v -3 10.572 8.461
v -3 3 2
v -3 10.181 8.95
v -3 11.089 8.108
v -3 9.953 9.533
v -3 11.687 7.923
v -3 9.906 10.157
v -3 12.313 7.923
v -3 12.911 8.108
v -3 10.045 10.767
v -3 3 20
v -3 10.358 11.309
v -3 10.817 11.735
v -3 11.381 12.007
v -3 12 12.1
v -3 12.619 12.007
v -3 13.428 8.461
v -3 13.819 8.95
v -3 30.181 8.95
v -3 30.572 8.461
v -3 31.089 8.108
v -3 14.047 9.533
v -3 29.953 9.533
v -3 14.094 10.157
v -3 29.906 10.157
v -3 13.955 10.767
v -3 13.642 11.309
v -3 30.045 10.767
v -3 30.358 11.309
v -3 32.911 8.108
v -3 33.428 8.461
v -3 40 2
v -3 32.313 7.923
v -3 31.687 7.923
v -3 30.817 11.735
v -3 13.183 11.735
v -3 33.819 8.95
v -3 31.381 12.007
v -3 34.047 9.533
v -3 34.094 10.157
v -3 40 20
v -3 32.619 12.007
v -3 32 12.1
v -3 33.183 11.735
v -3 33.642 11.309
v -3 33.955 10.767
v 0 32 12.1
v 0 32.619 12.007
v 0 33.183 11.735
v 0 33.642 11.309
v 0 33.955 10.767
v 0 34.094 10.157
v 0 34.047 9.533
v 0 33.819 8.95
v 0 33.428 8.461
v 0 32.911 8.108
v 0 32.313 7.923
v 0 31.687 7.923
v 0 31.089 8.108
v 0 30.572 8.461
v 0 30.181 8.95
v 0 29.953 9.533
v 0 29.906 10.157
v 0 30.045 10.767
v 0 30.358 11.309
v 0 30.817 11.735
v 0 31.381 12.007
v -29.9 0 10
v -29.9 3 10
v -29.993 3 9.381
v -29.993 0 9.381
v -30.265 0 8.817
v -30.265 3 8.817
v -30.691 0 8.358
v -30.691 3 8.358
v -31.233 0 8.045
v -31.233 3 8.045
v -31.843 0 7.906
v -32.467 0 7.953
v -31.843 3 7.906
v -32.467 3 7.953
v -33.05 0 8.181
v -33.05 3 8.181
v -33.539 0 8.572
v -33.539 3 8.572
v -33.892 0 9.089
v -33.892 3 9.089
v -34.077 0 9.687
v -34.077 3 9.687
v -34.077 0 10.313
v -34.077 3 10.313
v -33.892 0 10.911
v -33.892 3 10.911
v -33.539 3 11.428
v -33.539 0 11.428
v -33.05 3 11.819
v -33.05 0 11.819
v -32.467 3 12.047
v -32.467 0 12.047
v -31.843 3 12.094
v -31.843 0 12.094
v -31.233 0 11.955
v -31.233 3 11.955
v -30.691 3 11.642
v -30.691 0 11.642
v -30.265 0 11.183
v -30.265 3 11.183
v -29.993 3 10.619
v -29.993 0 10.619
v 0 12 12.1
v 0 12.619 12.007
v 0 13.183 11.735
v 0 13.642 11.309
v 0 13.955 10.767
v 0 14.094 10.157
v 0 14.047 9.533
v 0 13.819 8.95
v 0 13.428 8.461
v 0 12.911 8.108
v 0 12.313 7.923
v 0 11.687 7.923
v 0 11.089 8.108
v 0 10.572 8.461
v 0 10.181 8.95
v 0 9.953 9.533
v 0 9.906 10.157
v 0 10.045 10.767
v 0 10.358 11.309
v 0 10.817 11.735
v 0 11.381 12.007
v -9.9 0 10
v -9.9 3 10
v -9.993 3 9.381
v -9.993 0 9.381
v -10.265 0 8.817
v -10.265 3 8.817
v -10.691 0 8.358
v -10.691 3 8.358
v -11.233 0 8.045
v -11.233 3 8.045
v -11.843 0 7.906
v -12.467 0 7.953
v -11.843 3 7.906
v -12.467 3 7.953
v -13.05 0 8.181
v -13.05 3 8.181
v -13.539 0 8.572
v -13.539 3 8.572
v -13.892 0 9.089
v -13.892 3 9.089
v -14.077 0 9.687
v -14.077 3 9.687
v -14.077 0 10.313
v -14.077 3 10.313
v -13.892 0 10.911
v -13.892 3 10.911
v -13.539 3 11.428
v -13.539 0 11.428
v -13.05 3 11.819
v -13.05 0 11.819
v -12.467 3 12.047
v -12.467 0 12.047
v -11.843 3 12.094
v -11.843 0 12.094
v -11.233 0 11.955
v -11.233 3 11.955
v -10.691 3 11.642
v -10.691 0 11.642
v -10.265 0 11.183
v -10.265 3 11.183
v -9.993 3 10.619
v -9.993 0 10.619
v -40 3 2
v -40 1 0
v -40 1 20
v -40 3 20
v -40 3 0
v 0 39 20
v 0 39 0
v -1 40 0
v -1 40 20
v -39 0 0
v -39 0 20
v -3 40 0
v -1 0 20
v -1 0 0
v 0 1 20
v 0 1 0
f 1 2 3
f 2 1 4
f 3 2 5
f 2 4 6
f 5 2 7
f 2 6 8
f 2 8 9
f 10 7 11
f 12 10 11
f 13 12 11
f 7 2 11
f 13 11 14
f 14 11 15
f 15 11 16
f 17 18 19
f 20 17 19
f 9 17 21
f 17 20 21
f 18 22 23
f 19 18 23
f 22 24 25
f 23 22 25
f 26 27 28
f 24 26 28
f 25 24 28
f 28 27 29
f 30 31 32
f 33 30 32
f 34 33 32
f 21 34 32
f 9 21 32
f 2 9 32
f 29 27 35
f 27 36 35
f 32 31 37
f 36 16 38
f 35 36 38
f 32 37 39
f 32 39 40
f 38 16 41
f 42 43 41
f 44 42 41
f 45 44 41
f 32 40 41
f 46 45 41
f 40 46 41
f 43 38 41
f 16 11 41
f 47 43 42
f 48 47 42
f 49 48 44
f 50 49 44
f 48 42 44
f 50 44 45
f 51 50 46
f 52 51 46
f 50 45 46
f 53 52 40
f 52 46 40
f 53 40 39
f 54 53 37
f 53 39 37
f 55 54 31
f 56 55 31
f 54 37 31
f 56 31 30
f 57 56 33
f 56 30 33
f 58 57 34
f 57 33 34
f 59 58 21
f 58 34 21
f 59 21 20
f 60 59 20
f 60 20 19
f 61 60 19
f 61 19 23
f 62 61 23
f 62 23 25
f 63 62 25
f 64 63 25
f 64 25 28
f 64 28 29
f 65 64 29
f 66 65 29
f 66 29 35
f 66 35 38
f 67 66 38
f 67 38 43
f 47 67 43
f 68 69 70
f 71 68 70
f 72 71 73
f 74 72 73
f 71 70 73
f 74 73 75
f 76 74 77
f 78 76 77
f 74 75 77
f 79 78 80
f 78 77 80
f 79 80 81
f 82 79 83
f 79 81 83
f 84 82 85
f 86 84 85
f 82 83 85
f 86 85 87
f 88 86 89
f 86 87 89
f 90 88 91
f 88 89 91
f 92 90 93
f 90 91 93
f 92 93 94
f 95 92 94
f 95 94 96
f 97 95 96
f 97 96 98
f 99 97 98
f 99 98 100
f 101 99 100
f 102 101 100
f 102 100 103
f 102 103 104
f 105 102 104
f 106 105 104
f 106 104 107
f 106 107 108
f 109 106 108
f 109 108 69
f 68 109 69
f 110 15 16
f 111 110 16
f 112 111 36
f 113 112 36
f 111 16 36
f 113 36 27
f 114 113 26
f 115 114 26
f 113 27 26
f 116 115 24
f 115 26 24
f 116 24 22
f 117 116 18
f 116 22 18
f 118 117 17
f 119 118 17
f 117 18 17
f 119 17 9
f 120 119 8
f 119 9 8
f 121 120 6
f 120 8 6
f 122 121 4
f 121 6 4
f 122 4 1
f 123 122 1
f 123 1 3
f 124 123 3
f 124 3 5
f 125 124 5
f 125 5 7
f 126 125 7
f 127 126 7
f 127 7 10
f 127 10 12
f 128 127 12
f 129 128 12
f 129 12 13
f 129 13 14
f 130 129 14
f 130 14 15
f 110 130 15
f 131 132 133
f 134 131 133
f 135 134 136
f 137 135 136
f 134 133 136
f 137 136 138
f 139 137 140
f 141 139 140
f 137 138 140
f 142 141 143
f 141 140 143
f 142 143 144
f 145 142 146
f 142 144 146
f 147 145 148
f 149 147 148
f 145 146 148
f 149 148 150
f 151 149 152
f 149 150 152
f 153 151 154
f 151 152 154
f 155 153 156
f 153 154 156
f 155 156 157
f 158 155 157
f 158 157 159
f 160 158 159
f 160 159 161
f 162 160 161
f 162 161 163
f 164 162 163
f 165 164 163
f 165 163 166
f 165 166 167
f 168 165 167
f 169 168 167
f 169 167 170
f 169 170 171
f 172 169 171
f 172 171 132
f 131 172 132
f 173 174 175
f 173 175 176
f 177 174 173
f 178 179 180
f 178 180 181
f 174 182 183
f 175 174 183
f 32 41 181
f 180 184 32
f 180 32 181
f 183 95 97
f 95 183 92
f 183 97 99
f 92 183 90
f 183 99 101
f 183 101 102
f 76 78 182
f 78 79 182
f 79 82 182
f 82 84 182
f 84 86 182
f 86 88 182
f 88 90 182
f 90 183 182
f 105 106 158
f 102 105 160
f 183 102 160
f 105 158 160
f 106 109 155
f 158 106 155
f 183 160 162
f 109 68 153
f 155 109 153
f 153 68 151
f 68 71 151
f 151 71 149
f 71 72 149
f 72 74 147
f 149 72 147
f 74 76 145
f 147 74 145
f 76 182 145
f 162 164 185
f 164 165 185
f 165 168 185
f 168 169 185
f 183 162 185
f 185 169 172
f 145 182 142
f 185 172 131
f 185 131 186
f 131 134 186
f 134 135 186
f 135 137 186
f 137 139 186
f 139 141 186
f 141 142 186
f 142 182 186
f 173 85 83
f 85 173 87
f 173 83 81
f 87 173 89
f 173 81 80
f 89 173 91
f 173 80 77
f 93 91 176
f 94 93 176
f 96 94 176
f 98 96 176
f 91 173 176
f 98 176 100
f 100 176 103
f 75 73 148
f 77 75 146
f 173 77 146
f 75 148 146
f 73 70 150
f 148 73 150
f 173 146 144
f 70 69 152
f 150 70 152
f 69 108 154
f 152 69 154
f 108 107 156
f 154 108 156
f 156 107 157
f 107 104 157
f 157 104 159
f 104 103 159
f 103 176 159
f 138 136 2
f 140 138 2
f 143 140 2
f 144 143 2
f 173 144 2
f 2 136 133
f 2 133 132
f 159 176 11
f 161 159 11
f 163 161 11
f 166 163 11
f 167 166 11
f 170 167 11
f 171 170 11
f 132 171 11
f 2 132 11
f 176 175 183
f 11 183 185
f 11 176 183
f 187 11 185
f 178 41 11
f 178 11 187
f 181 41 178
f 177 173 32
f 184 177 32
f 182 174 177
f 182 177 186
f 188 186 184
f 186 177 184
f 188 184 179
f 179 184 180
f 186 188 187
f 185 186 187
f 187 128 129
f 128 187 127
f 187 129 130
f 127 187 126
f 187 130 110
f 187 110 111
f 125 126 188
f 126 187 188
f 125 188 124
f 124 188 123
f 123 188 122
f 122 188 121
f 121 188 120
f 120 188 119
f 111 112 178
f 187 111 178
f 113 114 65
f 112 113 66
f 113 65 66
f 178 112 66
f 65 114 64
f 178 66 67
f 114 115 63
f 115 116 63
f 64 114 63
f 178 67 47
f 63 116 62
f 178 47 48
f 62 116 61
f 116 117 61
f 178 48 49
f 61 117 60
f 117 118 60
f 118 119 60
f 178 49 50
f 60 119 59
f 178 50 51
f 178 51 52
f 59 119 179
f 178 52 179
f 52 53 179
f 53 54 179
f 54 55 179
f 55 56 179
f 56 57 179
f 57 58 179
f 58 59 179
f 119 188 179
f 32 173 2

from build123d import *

# Parameters (mm, degrees)
ESQUISSE1_W             = 40
ESQUISSE1_H             = 40
BOSS_EXTRU_1_DEPTH      = 20
ESQUISSE2_W             = 37
ESQUISSE2_H             = 37
ENL_V_MAT_EXTRU_1_DEPTH = 18
ENL_V_MAT_EXTRU_2_DEPTH = 3
CHANFREIN1_SIZE         = 1
ESQUISSE4_R             = 2.1
ENL_V_MAT_EXTRU_3_DEPTH = 4
ESQUISSE5_R             = 2.1
ENL_V_MAT_EXTRU_4_DEPTH = 4


with BuildPart() as part:
    # Esquisse1 → Boss.-Extru.1 (new body)
    with BuildSketch(Plane.XY):
        with Locations((-20, 20)):
            Rectangle(ESQUISSE1_W, ESQUISSE1_H)
    extrude(amount=BOSS_EXTRU_1_DEPTH)

    # Esquisse2 → Enlèv. mat.-Extru.1 (cut)
    with BuildSketch(Plane.XY.offset(20)):
        with Locations((-21.5, 21.5)):
            Rectangle(ESQUISSE2_W, ESQUISSE2_H)
    extrude(amount=-ENL_V_MAT_EXTRU_1_DEPTH, mode=Mode.SUBTRACT)

    # Esquisse3 → Enlèv. mat.-Extru.2 (cut, through all)
    with BuildSketch(Plane.XY.offset(2)):
        Polygon((-40, 3), (-3, 40), (-40, 40), align=None)
    extrude(amount=-ENL_V_MAT_EXTRU_2_DEPTH, mode=Mode.SUBTRACT)

    # Chanfrein1
    chanfrein1_edges = [part.edges().sort_by_distance(p)[0] for p in [
        (0, 0, 10),
        (-40, 0, 10),
        (0, 40, 10),
    ]]
    chamfer(chanfrein1_edges, length=CHANFREIN1_SIZE)

    # Esquisse4 → Enlèv. mat.-Extru.3 (cut, through all)
    with BuildSketch(Plane(origin=(0, 3, 0), x_dir=(1, 0, 0), z_dir=(0, 1, 0))):
        with Locations((-12, -10)):
            Circle(ESQUISSE4_R)
        with Locations((-32, -10)):
            Circle(ESQUISSE4_R)
    extrude(amount=-ENL_V_MAT_EXTRU_3_DEPTH, mode=Mode.SUBTRACT)

    # Esquisse5 → Enlèv. mat.-Extru.4 (cut, through all)
    with BuildSketch(Plane.ZY.offset(3)):
        with Locations((10, 12)):
            Circle(ESQUISSE5_R)
        with Locations((10, 32)):
            Circle(ESQUISSE5_R)
    extrude(amount=-ENL_V_MAT_EXTRU_4_DEPTH, mode=Mode.SUBTRACT)


solid = part.part
